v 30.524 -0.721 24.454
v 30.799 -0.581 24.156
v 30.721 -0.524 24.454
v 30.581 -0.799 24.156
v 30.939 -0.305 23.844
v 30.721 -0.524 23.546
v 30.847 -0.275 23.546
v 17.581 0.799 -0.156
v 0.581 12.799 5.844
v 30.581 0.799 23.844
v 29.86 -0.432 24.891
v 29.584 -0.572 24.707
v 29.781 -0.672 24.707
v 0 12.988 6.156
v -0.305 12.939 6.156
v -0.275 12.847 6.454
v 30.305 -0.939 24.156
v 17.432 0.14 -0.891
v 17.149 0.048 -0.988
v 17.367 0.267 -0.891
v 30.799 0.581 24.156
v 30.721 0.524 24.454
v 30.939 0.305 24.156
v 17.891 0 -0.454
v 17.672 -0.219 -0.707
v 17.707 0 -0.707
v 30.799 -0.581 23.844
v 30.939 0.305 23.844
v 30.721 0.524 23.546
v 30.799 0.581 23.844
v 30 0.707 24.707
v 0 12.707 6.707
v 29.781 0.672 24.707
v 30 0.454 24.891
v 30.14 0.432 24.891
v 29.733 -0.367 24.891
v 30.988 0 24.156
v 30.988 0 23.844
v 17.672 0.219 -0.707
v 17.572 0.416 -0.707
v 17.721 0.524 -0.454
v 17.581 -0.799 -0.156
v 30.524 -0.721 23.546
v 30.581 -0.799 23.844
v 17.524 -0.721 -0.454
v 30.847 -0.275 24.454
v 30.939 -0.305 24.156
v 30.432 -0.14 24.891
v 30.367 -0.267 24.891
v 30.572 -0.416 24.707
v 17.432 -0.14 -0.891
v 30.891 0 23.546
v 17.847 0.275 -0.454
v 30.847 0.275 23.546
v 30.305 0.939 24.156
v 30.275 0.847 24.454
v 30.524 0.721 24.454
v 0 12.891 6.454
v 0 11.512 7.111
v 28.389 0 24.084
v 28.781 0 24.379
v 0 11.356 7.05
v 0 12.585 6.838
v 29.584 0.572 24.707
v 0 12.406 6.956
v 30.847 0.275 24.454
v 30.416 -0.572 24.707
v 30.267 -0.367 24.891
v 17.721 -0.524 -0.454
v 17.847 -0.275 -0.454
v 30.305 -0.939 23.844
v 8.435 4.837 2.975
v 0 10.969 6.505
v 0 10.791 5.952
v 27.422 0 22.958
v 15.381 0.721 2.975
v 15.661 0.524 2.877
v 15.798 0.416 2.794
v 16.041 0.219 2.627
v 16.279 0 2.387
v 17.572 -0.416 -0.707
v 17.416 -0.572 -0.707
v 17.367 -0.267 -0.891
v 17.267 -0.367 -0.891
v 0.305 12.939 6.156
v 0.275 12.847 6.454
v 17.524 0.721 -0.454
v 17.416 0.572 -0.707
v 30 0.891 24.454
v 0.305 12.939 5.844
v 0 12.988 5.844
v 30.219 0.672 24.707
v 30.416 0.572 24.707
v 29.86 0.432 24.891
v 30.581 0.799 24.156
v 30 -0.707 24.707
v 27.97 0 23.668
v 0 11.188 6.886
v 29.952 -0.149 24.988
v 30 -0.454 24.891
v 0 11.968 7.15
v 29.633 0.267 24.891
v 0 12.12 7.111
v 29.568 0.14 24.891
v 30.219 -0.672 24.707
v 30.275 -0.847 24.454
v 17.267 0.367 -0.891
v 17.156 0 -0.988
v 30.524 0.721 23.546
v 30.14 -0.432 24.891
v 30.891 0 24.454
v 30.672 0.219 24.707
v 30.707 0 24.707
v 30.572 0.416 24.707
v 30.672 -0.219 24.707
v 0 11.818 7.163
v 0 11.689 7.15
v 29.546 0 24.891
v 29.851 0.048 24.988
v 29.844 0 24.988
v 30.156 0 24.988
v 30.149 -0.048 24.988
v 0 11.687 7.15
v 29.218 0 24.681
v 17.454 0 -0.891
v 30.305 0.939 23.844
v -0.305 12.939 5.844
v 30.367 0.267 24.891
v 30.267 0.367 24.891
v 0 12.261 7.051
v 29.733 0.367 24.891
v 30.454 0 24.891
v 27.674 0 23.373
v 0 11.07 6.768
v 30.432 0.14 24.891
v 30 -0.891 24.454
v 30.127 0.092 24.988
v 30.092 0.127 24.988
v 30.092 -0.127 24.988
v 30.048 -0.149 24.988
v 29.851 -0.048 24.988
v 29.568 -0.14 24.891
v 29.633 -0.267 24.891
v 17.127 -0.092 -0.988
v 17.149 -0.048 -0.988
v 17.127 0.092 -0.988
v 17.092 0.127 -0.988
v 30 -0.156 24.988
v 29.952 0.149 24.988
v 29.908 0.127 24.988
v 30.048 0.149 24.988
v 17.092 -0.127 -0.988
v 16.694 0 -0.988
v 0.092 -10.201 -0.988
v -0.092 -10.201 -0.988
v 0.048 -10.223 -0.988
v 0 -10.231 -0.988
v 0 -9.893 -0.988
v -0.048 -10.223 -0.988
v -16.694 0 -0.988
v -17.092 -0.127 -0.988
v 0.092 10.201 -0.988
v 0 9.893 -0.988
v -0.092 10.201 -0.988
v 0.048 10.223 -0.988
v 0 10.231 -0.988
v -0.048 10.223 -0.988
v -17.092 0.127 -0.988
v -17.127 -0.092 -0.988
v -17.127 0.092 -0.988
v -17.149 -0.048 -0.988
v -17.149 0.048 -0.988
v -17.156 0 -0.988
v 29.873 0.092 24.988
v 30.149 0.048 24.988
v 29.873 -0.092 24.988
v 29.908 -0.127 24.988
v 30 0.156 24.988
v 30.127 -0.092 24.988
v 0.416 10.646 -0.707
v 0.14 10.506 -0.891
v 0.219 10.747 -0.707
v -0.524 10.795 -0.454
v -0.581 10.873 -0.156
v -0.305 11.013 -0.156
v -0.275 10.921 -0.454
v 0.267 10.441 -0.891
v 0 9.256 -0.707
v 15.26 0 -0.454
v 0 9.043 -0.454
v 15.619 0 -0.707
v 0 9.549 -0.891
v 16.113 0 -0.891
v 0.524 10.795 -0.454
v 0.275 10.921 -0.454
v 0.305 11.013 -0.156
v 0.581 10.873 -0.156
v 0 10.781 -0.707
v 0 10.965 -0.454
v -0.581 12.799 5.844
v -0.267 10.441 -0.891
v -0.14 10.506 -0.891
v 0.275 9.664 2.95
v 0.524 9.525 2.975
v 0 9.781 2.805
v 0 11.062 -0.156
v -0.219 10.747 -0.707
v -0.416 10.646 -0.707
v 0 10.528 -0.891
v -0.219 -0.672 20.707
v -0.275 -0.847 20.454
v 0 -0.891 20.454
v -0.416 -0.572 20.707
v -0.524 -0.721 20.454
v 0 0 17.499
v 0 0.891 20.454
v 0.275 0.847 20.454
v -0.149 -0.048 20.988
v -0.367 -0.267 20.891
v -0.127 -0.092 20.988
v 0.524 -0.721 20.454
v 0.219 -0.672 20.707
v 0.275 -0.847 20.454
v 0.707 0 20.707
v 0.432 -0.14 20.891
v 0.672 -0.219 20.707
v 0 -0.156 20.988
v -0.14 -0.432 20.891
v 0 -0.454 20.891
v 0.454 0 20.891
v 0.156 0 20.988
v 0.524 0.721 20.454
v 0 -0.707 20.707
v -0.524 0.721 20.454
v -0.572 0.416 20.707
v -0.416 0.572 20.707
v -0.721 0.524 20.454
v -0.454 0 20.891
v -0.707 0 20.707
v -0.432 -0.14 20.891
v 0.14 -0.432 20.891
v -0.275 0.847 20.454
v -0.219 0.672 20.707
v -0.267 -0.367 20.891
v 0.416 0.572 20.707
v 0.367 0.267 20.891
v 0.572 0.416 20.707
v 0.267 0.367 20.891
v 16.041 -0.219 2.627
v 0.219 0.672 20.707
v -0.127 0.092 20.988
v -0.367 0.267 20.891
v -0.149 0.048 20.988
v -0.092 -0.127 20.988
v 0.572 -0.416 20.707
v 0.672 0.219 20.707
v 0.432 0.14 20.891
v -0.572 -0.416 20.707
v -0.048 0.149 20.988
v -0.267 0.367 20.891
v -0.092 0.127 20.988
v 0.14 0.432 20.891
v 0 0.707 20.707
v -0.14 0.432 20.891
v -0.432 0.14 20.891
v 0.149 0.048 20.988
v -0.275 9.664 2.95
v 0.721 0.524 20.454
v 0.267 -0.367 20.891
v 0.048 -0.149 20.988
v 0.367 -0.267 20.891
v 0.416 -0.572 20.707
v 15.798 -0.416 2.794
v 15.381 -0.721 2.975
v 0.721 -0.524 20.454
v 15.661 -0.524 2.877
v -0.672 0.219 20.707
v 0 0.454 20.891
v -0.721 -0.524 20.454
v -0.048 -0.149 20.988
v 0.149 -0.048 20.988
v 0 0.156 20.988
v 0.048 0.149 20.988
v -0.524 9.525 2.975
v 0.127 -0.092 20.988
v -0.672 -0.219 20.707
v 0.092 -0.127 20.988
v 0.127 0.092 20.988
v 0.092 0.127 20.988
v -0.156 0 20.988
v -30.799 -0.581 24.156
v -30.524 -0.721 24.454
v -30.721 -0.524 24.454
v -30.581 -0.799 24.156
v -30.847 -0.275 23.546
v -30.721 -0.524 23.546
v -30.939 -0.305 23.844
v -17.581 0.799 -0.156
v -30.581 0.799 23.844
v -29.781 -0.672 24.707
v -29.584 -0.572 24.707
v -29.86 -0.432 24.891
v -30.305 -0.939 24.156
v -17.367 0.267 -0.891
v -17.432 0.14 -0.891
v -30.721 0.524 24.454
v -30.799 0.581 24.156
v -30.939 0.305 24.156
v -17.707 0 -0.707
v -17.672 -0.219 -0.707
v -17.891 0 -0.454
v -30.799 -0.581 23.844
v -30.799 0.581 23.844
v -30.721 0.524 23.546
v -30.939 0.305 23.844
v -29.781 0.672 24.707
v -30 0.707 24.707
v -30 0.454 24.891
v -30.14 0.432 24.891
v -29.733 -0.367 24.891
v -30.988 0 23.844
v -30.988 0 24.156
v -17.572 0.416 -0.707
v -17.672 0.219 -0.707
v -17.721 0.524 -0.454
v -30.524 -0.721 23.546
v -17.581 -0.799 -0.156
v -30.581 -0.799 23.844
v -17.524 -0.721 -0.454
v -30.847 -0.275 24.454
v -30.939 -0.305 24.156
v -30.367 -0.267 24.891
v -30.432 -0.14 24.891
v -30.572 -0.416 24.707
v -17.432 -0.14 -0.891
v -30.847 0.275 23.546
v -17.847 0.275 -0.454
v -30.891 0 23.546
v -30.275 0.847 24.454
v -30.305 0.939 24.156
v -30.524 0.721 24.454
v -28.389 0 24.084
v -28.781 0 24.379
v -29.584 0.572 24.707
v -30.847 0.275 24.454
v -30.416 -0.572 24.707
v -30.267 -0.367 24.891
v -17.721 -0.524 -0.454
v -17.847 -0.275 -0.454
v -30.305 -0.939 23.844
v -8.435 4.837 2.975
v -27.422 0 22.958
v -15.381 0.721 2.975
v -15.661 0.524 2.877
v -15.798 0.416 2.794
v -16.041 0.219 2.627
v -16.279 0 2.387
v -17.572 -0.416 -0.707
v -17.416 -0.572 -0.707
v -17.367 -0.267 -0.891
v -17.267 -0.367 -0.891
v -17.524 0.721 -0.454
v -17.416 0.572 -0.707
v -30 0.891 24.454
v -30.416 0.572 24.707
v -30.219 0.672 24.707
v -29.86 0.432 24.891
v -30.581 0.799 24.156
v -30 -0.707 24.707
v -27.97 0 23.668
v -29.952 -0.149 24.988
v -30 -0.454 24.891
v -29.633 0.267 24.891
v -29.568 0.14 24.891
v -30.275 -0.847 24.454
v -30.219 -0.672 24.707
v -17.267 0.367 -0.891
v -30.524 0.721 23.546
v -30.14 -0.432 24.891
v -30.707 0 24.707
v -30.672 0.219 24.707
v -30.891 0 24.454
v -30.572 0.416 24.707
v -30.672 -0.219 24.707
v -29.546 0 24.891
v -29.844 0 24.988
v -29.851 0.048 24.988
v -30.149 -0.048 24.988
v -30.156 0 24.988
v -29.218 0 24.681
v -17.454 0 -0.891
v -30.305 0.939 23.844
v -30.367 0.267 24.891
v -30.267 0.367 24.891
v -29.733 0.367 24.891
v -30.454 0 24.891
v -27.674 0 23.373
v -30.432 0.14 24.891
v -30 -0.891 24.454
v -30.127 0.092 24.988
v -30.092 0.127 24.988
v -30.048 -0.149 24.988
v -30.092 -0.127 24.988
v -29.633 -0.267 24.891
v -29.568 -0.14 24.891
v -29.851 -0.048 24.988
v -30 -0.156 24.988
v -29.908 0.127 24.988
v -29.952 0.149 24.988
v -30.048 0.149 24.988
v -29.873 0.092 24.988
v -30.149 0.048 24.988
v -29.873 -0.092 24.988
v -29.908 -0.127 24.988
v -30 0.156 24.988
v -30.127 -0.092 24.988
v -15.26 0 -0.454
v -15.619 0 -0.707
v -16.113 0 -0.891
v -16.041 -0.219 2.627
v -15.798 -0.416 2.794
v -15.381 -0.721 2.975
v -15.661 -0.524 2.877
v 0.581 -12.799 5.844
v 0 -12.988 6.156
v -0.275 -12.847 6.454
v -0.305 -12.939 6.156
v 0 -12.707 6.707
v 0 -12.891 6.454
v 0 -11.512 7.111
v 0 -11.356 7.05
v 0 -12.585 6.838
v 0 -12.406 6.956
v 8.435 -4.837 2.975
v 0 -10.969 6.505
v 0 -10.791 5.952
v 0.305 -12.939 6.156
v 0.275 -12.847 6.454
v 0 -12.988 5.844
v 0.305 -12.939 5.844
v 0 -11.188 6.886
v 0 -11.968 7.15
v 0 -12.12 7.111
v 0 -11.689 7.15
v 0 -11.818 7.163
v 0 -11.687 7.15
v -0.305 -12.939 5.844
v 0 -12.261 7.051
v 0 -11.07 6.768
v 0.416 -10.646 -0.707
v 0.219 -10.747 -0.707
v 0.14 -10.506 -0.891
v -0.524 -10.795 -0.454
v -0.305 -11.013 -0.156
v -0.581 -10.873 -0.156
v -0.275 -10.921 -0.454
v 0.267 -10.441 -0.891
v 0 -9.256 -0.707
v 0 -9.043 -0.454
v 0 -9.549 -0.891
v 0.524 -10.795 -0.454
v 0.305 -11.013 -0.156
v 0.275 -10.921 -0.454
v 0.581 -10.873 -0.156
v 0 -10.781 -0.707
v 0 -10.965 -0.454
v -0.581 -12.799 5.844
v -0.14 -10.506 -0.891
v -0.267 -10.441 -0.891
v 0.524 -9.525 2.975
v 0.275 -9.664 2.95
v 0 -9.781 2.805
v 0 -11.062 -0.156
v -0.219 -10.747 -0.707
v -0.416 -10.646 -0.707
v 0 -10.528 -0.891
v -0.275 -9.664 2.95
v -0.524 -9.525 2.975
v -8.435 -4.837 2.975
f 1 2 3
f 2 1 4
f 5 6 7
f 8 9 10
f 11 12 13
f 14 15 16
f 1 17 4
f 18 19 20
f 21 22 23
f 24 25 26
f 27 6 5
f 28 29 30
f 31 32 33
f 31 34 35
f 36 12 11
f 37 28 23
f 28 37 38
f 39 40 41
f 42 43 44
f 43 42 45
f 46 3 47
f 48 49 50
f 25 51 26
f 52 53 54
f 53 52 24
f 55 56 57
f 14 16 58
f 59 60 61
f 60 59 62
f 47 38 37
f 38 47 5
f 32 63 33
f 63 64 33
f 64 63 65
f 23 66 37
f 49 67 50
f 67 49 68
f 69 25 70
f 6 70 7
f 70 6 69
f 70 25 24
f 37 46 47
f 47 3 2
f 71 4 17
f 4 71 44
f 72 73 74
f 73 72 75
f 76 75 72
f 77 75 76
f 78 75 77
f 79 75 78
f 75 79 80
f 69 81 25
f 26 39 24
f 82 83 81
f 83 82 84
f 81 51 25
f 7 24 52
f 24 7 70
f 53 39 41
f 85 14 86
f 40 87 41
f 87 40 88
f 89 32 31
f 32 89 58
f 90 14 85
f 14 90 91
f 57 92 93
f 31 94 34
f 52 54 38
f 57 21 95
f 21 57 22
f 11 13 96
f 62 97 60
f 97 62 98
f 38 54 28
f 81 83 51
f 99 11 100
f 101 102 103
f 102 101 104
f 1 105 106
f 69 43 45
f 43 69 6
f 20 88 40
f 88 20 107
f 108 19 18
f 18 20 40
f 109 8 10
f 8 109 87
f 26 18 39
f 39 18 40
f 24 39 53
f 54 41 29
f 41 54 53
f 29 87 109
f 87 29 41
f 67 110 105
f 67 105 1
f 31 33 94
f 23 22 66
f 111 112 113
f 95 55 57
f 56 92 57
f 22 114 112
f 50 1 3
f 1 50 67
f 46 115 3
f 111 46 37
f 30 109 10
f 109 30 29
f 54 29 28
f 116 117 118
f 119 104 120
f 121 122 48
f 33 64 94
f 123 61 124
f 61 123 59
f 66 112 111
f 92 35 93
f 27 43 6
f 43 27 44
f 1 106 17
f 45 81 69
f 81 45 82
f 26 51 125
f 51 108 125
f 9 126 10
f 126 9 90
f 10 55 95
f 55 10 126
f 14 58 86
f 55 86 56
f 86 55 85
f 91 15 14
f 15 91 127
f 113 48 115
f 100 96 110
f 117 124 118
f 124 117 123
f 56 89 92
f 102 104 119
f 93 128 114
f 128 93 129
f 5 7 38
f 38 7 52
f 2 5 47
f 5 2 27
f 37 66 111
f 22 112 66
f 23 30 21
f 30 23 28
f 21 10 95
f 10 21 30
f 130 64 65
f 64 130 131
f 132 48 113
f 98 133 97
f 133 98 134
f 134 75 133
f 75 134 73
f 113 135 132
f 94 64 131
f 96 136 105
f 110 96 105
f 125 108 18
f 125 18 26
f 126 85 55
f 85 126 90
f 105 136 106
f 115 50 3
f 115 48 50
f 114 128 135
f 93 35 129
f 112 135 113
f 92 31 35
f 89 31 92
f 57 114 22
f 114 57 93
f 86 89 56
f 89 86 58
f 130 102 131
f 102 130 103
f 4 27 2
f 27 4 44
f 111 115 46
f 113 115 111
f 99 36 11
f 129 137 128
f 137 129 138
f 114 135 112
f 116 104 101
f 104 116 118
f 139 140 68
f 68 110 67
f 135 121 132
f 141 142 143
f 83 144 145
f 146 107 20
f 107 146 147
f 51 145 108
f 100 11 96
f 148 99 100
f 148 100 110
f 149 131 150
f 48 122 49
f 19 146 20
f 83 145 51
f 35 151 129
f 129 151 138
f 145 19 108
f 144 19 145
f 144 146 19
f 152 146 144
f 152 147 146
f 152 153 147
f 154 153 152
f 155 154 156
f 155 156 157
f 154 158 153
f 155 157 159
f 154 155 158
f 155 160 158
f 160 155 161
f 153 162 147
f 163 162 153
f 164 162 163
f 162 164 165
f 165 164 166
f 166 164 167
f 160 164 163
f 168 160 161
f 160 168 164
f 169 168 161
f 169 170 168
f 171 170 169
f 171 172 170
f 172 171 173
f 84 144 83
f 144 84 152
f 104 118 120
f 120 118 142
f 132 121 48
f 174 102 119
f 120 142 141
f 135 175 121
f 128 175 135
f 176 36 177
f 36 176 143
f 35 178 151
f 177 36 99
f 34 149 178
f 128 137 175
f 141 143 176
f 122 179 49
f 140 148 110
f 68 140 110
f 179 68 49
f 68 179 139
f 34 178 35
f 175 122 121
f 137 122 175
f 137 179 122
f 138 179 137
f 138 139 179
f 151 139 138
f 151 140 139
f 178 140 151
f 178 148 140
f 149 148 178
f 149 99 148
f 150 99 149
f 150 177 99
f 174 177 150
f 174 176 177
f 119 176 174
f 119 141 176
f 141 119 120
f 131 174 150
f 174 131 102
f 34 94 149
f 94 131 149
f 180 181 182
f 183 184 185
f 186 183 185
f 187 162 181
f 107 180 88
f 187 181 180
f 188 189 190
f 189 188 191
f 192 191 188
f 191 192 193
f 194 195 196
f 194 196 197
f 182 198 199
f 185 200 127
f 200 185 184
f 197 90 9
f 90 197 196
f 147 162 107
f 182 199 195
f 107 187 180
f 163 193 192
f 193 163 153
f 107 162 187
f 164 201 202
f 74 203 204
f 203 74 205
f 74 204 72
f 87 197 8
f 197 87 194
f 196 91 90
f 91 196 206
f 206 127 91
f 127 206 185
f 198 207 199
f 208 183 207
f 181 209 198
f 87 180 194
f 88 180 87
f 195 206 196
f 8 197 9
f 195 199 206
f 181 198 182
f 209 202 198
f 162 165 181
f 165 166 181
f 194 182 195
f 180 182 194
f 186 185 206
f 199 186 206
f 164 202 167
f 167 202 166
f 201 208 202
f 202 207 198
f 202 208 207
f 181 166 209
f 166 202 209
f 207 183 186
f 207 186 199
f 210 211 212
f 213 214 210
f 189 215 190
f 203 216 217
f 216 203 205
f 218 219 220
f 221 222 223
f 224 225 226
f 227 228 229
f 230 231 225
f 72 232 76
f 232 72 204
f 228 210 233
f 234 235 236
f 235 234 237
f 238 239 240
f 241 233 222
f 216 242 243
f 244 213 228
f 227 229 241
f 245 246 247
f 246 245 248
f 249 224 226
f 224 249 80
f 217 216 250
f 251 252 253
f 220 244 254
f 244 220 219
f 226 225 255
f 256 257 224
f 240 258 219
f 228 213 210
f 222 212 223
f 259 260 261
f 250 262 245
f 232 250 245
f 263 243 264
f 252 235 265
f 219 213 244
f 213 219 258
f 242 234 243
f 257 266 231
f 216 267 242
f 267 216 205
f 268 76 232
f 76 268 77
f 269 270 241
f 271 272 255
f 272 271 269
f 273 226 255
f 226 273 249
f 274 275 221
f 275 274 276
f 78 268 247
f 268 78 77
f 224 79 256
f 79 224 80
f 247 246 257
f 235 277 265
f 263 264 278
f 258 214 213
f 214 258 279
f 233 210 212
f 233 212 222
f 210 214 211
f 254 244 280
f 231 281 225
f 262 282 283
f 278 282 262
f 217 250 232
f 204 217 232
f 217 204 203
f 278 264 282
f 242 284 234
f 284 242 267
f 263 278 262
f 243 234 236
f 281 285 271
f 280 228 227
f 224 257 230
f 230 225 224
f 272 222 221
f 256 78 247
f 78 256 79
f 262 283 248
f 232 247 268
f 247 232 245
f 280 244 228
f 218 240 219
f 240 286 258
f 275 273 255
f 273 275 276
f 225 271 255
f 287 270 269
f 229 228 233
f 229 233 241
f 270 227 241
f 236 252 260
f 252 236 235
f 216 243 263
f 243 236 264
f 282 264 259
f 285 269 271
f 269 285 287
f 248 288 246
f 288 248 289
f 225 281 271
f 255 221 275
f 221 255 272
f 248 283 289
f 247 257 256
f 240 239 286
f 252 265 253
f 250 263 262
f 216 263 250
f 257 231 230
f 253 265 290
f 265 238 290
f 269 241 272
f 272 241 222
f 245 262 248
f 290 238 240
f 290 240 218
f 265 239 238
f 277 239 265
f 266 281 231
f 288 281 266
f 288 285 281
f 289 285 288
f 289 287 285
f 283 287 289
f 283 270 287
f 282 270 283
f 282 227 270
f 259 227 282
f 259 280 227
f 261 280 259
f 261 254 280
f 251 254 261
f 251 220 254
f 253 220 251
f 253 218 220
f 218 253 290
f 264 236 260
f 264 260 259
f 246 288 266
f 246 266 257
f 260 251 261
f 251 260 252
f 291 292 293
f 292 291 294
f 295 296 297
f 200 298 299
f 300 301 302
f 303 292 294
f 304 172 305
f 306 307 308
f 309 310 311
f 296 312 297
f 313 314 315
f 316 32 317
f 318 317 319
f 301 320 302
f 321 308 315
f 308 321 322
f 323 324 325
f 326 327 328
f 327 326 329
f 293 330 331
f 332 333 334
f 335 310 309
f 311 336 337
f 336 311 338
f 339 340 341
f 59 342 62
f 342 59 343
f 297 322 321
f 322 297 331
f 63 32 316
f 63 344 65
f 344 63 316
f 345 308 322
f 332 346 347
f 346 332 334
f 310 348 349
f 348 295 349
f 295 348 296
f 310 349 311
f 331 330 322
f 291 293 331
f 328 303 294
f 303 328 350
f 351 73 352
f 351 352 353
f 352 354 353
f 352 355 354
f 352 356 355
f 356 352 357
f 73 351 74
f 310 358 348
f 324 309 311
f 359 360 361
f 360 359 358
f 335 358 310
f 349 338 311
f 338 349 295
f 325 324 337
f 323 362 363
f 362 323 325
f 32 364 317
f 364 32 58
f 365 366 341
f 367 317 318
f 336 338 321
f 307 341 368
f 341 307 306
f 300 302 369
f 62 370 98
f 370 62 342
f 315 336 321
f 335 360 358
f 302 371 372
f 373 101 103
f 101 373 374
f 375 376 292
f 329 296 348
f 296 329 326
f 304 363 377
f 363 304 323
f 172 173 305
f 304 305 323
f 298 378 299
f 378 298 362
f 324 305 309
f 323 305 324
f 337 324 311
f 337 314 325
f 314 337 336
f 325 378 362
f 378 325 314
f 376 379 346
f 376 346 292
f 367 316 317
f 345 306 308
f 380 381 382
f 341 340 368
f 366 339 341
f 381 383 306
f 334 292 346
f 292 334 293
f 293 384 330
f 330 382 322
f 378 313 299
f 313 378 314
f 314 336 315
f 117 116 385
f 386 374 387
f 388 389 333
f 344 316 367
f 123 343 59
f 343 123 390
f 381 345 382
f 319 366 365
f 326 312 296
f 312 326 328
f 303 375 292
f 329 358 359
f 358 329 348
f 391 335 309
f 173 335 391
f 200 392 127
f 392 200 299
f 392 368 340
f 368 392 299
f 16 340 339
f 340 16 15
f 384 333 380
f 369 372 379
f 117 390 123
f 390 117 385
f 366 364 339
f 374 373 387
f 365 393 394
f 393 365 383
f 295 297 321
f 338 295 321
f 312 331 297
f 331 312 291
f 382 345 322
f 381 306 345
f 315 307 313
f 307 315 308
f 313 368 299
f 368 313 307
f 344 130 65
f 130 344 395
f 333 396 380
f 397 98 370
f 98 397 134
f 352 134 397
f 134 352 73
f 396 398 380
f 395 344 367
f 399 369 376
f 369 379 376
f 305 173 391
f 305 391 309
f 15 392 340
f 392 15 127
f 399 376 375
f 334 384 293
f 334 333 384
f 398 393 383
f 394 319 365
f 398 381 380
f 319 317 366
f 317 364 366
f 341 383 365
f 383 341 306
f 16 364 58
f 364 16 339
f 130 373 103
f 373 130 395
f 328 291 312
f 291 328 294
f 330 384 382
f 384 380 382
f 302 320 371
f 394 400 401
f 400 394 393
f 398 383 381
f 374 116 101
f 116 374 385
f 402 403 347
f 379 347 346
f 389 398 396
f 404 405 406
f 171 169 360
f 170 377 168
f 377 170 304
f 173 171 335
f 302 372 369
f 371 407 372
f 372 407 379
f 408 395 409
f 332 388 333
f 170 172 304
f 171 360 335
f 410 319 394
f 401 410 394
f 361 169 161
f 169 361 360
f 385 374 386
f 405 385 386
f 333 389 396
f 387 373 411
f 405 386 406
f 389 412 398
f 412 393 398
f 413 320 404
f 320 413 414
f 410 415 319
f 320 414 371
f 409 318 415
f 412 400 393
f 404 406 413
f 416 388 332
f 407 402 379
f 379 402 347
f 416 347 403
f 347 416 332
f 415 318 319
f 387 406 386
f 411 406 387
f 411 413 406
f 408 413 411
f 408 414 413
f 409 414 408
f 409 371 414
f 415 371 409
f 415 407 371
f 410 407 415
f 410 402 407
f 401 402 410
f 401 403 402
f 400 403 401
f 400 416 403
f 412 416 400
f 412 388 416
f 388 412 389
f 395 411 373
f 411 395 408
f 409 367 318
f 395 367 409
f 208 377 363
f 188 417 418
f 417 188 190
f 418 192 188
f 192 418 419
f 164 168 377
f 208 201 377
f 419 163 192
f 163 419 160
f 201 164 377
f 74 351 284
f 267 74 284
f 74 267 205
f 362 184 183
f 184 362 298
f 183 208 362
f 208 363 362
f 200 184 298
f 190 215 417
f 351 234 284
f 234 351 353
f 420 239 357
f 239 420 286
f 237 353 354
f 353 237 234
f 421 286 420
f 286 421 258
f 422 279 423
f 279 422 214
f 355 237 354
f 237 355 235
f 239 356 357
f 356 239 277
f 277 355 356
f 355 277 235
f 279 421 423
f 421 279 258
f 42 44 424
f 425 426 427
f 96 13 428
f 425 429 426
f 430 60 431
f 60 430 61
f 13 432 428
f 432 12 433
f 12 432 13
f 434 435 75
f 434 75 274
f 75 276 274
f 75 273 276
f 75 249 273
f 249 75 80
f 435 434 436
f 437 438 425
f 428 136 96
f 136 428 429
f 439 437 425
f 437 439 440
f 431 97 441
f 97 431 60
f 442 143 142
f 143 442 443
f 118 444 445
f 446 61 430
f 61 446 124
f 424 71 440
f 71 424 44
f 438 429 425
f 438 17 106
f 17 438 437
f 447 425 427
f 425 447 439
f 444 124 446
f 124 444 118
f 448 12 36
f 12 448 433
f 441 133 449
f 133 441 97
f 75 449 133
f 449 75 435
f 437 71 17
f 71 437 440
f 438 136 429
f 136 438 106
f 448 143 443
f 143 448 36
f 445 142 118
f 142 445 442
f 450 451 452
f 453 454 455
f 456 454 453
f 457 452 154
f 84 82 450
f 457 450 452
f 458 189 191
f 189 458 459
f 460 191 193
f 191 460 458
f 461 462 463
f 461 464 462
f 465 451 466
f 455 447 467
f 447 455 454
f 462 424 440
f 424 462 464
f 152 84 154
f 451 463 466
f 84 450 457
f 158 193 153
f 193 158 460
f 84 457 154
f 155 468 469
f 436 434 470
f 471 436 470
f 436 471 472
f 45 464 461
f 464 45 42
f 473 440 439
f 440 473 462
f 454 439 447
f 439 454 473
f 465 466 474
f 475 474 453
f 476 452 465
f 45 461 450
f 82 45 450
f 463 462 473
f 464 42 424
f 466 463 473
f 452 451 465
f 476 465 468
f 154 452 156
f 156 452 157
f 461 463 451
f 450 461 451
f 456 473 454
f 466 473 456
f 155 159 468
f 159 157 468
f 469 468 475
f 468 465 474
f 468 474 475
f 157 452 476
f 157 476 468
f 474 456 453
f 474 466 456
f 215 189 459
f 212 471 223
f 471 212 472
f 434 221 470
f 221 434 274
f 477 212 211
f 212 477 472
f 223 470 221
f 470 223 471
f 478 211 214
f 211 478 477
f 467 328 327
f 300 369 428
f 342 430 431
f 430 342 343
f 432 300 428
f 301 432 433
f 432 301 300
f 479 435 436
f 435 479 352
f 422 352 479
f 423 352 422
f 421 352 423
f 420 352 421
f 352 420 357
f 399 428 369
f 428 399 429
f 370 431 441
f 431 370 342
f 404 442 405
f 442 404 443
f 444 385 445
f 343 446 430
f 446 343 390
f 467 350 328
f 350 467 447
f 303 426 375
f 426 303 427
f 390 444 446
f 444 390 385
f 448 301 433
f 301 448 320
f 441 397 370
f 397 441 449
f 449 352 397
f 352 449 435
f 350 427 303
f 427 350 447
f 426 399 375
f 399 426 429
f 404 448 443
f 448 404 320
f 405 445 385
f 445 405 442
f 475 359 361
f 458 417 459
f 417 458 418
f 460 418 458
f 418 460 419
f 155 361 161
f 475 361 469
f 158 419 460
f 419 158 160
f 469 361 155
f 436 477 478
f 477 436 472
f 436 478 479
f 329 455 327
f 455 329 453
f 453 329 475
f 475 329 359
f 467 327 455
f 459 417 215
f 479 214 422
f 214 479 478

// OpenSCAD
/*
   origami ship
   straight sides
   
   Kit Wallace

*/
// length of bow from centre
lb=15; 
// height of bow
hb=12;
// width midships
wm=6; 
// height midships
hm=3; 
// waterline length e.g. from centre eg. half length of bow
wl=8.5; 
// width of hull from centre  - here this is computed so sides has no crease
// wh; 

// height of sail
h=10; 
//Thickness of paper
thickness=1;
// sphere quality
steps = 20;
// overall scale
scale=2;

module double(axis) { 
      union() {
          children();
          mirror(axis) children();
      }
  }
module plane(s,t=0.5) {
    hull()
    for (i=[0:len(s) -1])
       translate(s[i]) sphere(t/2);     
    } 

module ground(size=50) {
   translate([0,0,-size]) cube(2*size,center=true);
}

// functions to make 4 points coplanar - by computing the value of one value so that determinat of matri of 4 points is zero

function det4(m) =
// from http://www.euclideanspace.com/maths/algebra/matrix/functions/determinant/fourD/index.htm
    m[0][3] * m[1][2] * m[2][1] * m[3][0] - m[0][2] * m[1][3] * m[2][1] * m[3][0]- m[0][3] * m[1][1] * m[2][2] * m[3][0]+m[0][1] * m[1][3] * m[2][2] * m[3][0]+ m[0][2] * m[1][1] * m[2][3] * m[3][0]-m[0][1] * m[1][2] * m[2][3] * m[3][0]- m[0][3] * m[1][2] * m[2][0] * m[3][1]+m[0][2] * m[1][3] * m[2][0] * m[3][1]+ m[0][3] * m[1][0] * m[2][2] * m[3][1]-m[0][0] * m[1][3] * m[2][2] * m[3][1]- m[0][2] * m[1][0] * m[2][3] * m[3][1]+m[0][0] * m[1][2] * m[2][3] * m[3][1]+ m[0][3] * m[1][1] * m[2][0] * m[3][2]-m[0][1] * m[1][3] * m[2][0] * m[3][2]- m[0][3] * m[1][0] * m[2][1] * m[3][2]+m[0][0] * m[1][3] * m[2][1] * m[3][2]+ m[0][1] * m[1][0] * m[2][3] * m[3][2]-m[0][0] * m[1][1] * m[2][3] * m[3][2]- m[0][2] * m[1][1] * m[2][0] * m[3][3]+m[0][1] * m[1][2] * m[2][0] * m[3][3]+ m[0][2] * m[1][0] * m[2][1] * m[3][3]-m[0][0] * m[1][2] * m[2][1] * m[3][3]- m[0][1] * m[1][0] * m[2][2] * m[3][3]+m[0][0] * m[1][1] * m[2][2] * m[3][3];

// to iteratively solve det(x) = -
function secant(xn,xn1,eps=0.001) =
     let(fxn=f(xn))
     let(fxn1=f(xn1))
     let(x = xn - fxn*(xn - xn1)/ (fxn - fxn1))
     abs(f(x) - fxn) < eps
        ? x
        : secant(x,xn,eps);
 

p1=[lb,0,hb];
p2=[wl,0,0];
p3=[0,wm,hm];
p5=[0,0,h];

function f(x) = 
 let(m = [  
       [lb,0,hb,1],
       [wl,0,0,1],
       [0,wm,hm,1],
       [0,x,0,1]]
     )
  det4(m);
  
wh= secant(0,wm);
echo(wh);

p4=[0,wh,0];

module ship_q(t) {
   plane([p1,p2,p3],t);
   plane([p2,p3,p4],t);
   plane([p4,p2,p5],t);
};

$fn=steps;
scale(scale) 
 difference() {
  double([0,1,0]) 
     double([1,0,0]) 
         ship_q(thickness); 
 * ground();
 }
